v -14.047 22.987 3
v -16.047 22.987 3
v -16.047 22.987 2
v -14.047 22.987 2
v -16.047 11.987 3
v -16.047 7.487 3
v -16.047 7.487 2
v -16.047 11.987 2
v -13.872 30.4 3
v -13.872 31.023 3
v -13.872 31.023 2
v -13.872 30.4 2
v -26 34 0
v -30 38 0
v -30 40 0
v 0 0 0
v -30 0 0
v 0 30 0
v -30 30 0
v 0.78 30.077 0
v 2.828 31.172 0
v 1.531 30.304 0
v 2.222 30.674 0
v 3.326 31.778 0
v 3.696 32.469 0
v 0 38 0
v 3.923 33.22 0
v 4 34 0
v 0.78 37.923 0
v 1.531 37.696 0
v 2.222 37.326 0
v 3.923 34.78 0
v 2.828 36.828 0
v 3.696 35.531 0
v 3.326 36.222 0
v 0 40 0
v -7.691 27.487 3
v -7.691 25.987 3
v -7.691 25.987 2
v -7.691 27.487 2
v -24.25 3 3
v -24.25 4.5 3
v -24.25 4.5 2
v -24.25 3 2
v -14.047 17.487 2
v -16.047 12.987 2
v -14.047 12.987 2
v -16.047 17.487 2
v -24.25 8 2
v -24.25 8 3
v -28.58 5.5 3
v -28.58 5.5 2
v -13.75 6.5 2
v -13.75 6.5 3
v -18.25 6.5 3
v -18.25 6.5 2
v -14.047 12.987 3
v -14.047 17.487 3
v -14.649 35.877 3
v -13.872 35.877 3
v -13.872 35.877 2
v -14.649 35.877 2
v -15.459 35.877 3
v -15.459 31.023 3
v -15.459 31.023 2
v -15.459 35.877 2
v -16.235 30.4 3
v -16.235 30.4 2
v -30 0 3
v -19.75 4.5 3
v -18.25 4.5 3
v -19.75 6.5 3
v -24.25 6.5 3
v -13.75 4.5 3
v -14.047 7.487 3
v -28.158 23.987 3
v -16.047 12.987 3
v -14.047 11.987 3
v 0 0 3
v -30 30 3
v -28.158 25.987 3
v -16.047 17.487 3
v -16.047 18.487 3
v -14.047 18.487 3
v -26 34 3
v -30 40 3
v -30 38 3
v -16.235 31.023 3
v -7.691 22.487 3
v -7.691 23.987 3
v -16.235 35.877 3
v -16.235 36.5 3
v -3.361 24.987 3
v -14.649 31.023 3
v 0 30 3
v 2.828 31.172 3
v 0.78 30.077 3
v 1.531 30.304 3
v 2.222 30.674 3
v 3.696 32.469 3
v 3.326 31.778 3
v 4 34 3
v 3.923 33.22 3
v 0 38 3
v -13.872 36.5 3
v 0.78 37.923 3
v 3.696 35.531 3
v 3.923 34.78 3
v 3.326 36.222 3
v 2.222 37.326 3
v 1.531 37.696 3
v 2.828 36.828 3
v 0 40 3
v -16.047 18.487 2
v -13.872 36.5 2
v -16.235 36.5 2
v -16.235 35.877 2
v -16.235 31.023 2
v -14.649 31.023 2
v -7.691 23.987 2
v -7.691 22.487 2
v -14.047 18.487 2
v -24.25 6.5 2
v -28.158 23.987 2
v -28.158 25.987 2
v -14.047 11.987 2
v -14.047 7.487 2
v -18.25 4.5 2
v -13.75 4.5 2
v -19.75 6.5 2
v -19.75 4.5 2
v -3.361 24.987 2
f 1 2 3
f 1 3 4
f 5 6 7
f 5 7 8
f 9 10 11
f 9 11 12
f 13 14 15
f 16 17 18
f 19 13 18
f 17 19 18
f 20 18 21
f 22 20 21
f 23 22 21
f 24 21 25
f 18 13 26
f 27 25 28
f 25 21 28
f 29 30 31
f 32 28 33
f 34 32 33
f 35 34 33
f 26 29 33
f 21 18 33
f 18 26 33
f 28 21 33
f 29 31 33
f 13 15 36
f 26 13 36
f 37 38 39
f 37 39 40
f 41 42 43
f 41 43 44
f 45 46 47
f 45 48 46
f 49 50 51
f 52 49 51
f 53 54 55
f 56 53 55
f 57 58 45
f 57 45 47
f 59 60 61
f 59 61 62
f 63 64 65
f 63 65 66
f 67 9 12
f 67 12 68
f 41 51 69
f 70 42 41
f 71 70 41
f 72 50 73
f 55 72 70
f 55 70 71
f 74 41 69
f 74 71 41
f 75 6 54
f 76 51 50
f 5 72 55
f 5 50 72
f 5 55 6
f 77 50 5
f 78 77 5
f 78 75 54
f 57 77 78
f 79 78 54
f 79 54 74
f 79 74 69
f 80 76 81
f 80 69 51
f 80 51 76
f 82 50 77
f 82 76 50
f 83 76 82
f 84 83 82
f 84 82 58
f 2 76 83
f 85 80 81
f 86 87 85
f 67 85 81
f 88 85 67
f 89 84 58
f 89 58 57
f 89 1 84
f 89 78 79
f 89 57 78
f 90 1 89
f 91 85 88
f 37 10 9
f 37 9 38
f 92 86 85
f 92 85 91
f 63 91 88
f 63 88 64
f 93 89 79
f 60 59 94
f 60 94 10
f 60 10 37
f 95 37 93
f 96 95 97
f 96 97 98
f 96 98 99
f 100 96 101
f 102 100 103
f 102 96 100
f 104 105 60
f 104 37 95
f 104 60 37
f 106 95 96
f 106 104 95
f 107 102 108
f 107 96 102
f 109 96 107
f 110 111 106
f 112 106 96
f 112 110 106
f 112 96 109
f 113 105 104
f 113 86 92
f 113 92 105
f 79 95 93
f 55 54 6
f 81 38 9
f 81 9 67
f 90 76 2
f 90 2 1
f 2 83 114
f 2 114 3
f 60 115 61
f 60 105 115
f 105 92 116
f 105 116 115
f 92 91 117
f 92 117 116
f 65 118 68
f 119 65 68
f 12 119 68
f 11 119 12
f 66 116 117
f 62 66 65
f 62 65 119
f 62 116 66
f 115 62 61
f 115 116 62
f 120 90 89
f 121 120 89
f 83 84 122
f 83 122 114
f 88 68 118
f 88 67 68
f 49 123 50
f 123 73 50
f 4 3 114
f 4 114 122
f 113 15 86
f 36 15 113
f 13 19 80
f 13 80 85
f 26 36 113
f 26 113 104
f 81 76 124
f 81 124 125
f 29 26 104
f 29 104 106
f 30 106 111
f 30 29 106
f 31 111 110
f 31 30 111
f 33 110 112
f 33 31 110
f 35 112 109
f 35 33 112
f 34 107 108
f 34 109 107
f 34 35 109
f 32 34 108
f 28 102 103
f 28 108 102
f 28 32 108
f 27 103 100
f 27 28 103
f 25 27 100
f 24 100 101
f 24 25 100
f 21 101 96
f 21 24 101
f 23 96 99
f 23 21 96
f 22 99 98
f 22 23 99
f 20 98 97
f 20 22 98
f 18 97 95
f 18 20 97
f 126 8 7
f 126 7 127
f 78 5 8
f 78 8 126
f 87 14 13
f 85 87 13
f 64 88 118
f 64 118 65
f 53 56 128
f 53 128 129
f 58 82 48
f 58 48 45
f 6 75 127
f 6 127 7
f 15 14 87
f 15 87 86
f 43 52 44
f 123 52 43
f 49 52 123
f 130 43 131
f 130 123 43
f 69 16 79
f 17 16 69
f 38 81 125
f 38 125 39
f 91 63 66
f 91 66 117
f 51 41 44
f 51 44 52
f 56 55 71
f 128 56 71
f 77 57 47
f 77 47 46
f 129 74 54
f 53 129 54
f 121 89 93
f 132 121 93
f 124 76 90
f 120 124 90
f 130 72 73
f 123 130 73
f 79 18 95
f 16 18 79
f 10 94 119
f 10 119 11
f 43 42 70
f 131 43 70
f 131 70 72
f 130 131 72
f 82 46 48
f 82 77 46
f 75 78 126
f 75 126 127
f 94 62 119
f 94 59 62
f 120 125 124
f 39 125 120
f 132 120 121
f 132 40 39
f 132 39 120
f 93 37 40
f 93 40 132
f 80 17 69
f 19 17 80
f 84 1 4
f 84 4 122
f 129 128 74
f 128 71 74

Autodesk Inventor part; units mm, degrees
ref_plane "YZ Plane" through (0, 0, 0) normal (1, 0, 0) x (0, 1, 0)
ref_plane "XZ Plane" through (0, 0, 0) normal (0, 1, 0) x (-1, 0, 0)
ref_plane "XY Plane" through (0, 0, 0) normal (0, 0, 1) x (1, 0, 0)
sketch "Sketch1" plane through (0, 0, 0) normal (0, 0, 1) x (1, 0, 0)
  line L0 (0, 0) -> (-30, 0)
  line L1 (-30, 40) -> (0, 40)
  line L2 (-36.1318, 34) -> (13.8682, 34) construction
  arc A0 (0, 30) -> (0, 38) centre (0, 34) ccw
  circle A1 centre (-30, 34) radius 4 construction
  line L3 (-30, 30) -> (0, 30) construction
  line L4 (-30, 38) -> (-26, 34)
  line L5 (-30, 30) -> (-26, 34)
  line L6 (0, 40) -> (0, 38)
  line L7 (0, 30) -> (0, 0)
  line L8 (-30, 0) -> (-30, 30)
  line L9 (-30, 38) -> (-30, 40)
  dimension "d0" = 30
  dimension "d1" = 40
  dimension "d3" = 6
  dimension "d4" = 8
  dimension "d5" = 8
  dimension "d6" = 30
extrude "Extrusion1" add sketch "Sketch1" along normal blind 3
sketch "Sketch3" plane through (0, 0, 3) normal (0, 0, 1) x (1, 0, 0)
  line L0 (-30, 40) -> (0, 40) construction
  line L1 (-30, 0) -> (-30, 30) construction
  line L2 (0, 0) -> (-30, 0) construction
  line L3 (-15.0586, 25.9999) -> (-30, 25.9849) construction
  line L4 (-28.1581, 25.9868) -> (-7.691, 25.9868)
  line L5 (-7.691, 25.9868) -> (-7.691, 23.9868)
  line L6 (-28.1581, 23.9868) -> (-28.1581, 25.9868)
  line L7 (-7.691, 24.9868) -> (-1.5179, 24.9868) construction
  line L8 (-7.691, 25.9868) -> (-7.691, 27.4868)
  line L9 (-7.691, 27.4868) -> (-3.3609, 24.9868)
  line L10 (-7.691, 23.9868) -> (-7.691, 22.4868)
  line L11 (-7.691, 22.4868) -> (-3.3609, 24.9868)
  line L12 (-14.0467, 18.4868) -> (-16.0467, 18.4868)
  line L13 (-16.0467, 18.4868) -> (-16.0467, 22.9868)
  line L14 (-16.0467, 22.9868) -> (-14.0467, 22.9868)
  line L15 (-14.0467, 22.9868) -> (-14.0467, 18.4868)
  line L16 (-14.0467, 18.4868) -> (-16.0467, 22.9868) construction
  line L17 (-16.0467, 18.4868) -> (-14.0467, 22.9868) construction
  line L18 (-15, 0) -> (-15.0135, 6) construction
  line L19 (-15.0135, 6) -> (-28.7905, 6) construction
  line L20 (-13.75, 6.5) -> (-18.25, 6.5)
  line L21 (-18.25, 6.5) -> (-18.25, 4.5)
  line L22 (-18.25, 4.5) -> (-13.75, 4.5)
  line L23 (-13.75, 4.5) -> (-13.75, 6.5)
  line L24 (-19.75, 6.5) -> (-24.25, 6.5)
  line L25 (-19.75, 4.5) -> (-19.75, 6.5)
  line L26 (-24.25, 4.5) -> (-19.75, 4.5)
  line L27 (-24.25, 6.5) -> (-24.25, 4.5)
  line L28 (-24.25, 5.5) -> (-29.2128, 5.5) construction
  line L29 (-24.25, 6.5) -> (-24.25, 8)
  line L30 (-24.25, 8) -> (-28.5801, 5.5)
  line L31 (-24.25, 4.5) -> (-24.25, 3)
  line L32 (-24.25, 3) -> (-28.5801, 5.5)
  line L33 (-16.616, 36.5) -> (-11.3751, 36.5) construction
  line L34 (-11.3751, 36.5) -> (-11.3751, 28.9531) construction
  line L35 (-11.3751, 28.9531) -> (-16.616, 28.9531) construction
  line L36 (-16.616, 28.9531) -> (-16.616, 36.5) construction
  line L37 (-16.25, 40) -> (-16.25, 36.4806) construction
  line L38 (-28.1581, 23.9868) -> (-7.691, 23.9868)
  line L39 (-16.0467, 17.4868) -> (-14.0467, 17.4868)
  line L40 (-14.0467, 17.4868) -> (-14.0467, 12.9868)
  line L41 (-16.0467, 12.9868) -> (-16.0467, 17.4868)
  line L42 (-14.0467, 12.9868) -> (-16.0467, 12.9868)
  line L43 (-16.0467, 12.9868) -> (-14.0467, 17.4868) construction
  line L44 (-14.0467, 12.9868) -> (-16.0467, 17.4868) construction
  line L45 (-16.0467, 11.9868) -> (-14.0467, 11.9868)
  line L46 (-14.0467, 11.9868) -> (-14.0467, 7.4868)
  line L47 (-16.0467, 7.4868) -> (-16.0467, 11.9868)
  line L48 (-14.0467, 7.4868) -> (-16.0467, 7.4868)
  line L49 (-16.0467, 7.4868) -> (-14.0467, 11.9868) construction
  line L50 (-14.0467, 7.4868) -> (-16.0467, 11.9868) construction
  line L51 (-13.8725, 30.4) -> (-16.2354, 30.4)
  line L52 (-16.2354, 30.4) -> (-16.2354, 31.0229)
  line L53 (-16.2354, 31.0229) -> (-15.4593, 31.0229)
  line L54 (-15.4593, 31.0229) -> (-15.4593, 35.8771)
  line L55 (-15.4593, 35.8771) -> (-16.2354, 35.8771)
  line L56 (-16.2354, 35.8771) -> (-16.2354, 36.5)
  line L57 (-16.2354, 36.5) -> (-13.8725, 36.5)
  line L58 (-13.8725, 36.5) -> (-13.8725, 35.8771)
  line L59 (-13.8725, 35.8771) -> (-14.6486, 35.8771)
  line L60 (-14.6486, 35.8771) -> (-14.6486, 31.0229)
  line L61 (-14.6486, 31.0229) -> (-13.8725, 31.0229)
  line L62 (-13.8725, 31.0229) -> (-13.8725, 30.4)
  point P0 (-15.0467, 20.7368)
  point P1 (-15.0467, 15.2368)
  point P2 (-15.0467, 9.7368)
  point P3 (-15, 40)
  point P4 (-15, 40)
  dimension "d10" = 26
  dimension "d11" = 2
  dimension "d12" = 1.5
  dimension "d13" = 5
  dimension "d14" = 1.5
  dimension "d15" = 2
  dimension "d16" = 4.5
  dimension "d24" = 6
  dimension "d25" = 4.5
  dimension "d26" = 2
  dimension "d29" = 6
  dimension "d34" = 1.5
  dimension "d35" = 5
  dimension "d36" = 1.5
  dimension "d39" = 8
  dimension "d40" = 1
  dimension "d48" = 5.5
  dimension "d53" = 3.5
  dimension "d54" = 14
extrude "Extrusion2" cut sketch "Sketch3" against normal blind 1
properties part number "MS_I[203] text"
